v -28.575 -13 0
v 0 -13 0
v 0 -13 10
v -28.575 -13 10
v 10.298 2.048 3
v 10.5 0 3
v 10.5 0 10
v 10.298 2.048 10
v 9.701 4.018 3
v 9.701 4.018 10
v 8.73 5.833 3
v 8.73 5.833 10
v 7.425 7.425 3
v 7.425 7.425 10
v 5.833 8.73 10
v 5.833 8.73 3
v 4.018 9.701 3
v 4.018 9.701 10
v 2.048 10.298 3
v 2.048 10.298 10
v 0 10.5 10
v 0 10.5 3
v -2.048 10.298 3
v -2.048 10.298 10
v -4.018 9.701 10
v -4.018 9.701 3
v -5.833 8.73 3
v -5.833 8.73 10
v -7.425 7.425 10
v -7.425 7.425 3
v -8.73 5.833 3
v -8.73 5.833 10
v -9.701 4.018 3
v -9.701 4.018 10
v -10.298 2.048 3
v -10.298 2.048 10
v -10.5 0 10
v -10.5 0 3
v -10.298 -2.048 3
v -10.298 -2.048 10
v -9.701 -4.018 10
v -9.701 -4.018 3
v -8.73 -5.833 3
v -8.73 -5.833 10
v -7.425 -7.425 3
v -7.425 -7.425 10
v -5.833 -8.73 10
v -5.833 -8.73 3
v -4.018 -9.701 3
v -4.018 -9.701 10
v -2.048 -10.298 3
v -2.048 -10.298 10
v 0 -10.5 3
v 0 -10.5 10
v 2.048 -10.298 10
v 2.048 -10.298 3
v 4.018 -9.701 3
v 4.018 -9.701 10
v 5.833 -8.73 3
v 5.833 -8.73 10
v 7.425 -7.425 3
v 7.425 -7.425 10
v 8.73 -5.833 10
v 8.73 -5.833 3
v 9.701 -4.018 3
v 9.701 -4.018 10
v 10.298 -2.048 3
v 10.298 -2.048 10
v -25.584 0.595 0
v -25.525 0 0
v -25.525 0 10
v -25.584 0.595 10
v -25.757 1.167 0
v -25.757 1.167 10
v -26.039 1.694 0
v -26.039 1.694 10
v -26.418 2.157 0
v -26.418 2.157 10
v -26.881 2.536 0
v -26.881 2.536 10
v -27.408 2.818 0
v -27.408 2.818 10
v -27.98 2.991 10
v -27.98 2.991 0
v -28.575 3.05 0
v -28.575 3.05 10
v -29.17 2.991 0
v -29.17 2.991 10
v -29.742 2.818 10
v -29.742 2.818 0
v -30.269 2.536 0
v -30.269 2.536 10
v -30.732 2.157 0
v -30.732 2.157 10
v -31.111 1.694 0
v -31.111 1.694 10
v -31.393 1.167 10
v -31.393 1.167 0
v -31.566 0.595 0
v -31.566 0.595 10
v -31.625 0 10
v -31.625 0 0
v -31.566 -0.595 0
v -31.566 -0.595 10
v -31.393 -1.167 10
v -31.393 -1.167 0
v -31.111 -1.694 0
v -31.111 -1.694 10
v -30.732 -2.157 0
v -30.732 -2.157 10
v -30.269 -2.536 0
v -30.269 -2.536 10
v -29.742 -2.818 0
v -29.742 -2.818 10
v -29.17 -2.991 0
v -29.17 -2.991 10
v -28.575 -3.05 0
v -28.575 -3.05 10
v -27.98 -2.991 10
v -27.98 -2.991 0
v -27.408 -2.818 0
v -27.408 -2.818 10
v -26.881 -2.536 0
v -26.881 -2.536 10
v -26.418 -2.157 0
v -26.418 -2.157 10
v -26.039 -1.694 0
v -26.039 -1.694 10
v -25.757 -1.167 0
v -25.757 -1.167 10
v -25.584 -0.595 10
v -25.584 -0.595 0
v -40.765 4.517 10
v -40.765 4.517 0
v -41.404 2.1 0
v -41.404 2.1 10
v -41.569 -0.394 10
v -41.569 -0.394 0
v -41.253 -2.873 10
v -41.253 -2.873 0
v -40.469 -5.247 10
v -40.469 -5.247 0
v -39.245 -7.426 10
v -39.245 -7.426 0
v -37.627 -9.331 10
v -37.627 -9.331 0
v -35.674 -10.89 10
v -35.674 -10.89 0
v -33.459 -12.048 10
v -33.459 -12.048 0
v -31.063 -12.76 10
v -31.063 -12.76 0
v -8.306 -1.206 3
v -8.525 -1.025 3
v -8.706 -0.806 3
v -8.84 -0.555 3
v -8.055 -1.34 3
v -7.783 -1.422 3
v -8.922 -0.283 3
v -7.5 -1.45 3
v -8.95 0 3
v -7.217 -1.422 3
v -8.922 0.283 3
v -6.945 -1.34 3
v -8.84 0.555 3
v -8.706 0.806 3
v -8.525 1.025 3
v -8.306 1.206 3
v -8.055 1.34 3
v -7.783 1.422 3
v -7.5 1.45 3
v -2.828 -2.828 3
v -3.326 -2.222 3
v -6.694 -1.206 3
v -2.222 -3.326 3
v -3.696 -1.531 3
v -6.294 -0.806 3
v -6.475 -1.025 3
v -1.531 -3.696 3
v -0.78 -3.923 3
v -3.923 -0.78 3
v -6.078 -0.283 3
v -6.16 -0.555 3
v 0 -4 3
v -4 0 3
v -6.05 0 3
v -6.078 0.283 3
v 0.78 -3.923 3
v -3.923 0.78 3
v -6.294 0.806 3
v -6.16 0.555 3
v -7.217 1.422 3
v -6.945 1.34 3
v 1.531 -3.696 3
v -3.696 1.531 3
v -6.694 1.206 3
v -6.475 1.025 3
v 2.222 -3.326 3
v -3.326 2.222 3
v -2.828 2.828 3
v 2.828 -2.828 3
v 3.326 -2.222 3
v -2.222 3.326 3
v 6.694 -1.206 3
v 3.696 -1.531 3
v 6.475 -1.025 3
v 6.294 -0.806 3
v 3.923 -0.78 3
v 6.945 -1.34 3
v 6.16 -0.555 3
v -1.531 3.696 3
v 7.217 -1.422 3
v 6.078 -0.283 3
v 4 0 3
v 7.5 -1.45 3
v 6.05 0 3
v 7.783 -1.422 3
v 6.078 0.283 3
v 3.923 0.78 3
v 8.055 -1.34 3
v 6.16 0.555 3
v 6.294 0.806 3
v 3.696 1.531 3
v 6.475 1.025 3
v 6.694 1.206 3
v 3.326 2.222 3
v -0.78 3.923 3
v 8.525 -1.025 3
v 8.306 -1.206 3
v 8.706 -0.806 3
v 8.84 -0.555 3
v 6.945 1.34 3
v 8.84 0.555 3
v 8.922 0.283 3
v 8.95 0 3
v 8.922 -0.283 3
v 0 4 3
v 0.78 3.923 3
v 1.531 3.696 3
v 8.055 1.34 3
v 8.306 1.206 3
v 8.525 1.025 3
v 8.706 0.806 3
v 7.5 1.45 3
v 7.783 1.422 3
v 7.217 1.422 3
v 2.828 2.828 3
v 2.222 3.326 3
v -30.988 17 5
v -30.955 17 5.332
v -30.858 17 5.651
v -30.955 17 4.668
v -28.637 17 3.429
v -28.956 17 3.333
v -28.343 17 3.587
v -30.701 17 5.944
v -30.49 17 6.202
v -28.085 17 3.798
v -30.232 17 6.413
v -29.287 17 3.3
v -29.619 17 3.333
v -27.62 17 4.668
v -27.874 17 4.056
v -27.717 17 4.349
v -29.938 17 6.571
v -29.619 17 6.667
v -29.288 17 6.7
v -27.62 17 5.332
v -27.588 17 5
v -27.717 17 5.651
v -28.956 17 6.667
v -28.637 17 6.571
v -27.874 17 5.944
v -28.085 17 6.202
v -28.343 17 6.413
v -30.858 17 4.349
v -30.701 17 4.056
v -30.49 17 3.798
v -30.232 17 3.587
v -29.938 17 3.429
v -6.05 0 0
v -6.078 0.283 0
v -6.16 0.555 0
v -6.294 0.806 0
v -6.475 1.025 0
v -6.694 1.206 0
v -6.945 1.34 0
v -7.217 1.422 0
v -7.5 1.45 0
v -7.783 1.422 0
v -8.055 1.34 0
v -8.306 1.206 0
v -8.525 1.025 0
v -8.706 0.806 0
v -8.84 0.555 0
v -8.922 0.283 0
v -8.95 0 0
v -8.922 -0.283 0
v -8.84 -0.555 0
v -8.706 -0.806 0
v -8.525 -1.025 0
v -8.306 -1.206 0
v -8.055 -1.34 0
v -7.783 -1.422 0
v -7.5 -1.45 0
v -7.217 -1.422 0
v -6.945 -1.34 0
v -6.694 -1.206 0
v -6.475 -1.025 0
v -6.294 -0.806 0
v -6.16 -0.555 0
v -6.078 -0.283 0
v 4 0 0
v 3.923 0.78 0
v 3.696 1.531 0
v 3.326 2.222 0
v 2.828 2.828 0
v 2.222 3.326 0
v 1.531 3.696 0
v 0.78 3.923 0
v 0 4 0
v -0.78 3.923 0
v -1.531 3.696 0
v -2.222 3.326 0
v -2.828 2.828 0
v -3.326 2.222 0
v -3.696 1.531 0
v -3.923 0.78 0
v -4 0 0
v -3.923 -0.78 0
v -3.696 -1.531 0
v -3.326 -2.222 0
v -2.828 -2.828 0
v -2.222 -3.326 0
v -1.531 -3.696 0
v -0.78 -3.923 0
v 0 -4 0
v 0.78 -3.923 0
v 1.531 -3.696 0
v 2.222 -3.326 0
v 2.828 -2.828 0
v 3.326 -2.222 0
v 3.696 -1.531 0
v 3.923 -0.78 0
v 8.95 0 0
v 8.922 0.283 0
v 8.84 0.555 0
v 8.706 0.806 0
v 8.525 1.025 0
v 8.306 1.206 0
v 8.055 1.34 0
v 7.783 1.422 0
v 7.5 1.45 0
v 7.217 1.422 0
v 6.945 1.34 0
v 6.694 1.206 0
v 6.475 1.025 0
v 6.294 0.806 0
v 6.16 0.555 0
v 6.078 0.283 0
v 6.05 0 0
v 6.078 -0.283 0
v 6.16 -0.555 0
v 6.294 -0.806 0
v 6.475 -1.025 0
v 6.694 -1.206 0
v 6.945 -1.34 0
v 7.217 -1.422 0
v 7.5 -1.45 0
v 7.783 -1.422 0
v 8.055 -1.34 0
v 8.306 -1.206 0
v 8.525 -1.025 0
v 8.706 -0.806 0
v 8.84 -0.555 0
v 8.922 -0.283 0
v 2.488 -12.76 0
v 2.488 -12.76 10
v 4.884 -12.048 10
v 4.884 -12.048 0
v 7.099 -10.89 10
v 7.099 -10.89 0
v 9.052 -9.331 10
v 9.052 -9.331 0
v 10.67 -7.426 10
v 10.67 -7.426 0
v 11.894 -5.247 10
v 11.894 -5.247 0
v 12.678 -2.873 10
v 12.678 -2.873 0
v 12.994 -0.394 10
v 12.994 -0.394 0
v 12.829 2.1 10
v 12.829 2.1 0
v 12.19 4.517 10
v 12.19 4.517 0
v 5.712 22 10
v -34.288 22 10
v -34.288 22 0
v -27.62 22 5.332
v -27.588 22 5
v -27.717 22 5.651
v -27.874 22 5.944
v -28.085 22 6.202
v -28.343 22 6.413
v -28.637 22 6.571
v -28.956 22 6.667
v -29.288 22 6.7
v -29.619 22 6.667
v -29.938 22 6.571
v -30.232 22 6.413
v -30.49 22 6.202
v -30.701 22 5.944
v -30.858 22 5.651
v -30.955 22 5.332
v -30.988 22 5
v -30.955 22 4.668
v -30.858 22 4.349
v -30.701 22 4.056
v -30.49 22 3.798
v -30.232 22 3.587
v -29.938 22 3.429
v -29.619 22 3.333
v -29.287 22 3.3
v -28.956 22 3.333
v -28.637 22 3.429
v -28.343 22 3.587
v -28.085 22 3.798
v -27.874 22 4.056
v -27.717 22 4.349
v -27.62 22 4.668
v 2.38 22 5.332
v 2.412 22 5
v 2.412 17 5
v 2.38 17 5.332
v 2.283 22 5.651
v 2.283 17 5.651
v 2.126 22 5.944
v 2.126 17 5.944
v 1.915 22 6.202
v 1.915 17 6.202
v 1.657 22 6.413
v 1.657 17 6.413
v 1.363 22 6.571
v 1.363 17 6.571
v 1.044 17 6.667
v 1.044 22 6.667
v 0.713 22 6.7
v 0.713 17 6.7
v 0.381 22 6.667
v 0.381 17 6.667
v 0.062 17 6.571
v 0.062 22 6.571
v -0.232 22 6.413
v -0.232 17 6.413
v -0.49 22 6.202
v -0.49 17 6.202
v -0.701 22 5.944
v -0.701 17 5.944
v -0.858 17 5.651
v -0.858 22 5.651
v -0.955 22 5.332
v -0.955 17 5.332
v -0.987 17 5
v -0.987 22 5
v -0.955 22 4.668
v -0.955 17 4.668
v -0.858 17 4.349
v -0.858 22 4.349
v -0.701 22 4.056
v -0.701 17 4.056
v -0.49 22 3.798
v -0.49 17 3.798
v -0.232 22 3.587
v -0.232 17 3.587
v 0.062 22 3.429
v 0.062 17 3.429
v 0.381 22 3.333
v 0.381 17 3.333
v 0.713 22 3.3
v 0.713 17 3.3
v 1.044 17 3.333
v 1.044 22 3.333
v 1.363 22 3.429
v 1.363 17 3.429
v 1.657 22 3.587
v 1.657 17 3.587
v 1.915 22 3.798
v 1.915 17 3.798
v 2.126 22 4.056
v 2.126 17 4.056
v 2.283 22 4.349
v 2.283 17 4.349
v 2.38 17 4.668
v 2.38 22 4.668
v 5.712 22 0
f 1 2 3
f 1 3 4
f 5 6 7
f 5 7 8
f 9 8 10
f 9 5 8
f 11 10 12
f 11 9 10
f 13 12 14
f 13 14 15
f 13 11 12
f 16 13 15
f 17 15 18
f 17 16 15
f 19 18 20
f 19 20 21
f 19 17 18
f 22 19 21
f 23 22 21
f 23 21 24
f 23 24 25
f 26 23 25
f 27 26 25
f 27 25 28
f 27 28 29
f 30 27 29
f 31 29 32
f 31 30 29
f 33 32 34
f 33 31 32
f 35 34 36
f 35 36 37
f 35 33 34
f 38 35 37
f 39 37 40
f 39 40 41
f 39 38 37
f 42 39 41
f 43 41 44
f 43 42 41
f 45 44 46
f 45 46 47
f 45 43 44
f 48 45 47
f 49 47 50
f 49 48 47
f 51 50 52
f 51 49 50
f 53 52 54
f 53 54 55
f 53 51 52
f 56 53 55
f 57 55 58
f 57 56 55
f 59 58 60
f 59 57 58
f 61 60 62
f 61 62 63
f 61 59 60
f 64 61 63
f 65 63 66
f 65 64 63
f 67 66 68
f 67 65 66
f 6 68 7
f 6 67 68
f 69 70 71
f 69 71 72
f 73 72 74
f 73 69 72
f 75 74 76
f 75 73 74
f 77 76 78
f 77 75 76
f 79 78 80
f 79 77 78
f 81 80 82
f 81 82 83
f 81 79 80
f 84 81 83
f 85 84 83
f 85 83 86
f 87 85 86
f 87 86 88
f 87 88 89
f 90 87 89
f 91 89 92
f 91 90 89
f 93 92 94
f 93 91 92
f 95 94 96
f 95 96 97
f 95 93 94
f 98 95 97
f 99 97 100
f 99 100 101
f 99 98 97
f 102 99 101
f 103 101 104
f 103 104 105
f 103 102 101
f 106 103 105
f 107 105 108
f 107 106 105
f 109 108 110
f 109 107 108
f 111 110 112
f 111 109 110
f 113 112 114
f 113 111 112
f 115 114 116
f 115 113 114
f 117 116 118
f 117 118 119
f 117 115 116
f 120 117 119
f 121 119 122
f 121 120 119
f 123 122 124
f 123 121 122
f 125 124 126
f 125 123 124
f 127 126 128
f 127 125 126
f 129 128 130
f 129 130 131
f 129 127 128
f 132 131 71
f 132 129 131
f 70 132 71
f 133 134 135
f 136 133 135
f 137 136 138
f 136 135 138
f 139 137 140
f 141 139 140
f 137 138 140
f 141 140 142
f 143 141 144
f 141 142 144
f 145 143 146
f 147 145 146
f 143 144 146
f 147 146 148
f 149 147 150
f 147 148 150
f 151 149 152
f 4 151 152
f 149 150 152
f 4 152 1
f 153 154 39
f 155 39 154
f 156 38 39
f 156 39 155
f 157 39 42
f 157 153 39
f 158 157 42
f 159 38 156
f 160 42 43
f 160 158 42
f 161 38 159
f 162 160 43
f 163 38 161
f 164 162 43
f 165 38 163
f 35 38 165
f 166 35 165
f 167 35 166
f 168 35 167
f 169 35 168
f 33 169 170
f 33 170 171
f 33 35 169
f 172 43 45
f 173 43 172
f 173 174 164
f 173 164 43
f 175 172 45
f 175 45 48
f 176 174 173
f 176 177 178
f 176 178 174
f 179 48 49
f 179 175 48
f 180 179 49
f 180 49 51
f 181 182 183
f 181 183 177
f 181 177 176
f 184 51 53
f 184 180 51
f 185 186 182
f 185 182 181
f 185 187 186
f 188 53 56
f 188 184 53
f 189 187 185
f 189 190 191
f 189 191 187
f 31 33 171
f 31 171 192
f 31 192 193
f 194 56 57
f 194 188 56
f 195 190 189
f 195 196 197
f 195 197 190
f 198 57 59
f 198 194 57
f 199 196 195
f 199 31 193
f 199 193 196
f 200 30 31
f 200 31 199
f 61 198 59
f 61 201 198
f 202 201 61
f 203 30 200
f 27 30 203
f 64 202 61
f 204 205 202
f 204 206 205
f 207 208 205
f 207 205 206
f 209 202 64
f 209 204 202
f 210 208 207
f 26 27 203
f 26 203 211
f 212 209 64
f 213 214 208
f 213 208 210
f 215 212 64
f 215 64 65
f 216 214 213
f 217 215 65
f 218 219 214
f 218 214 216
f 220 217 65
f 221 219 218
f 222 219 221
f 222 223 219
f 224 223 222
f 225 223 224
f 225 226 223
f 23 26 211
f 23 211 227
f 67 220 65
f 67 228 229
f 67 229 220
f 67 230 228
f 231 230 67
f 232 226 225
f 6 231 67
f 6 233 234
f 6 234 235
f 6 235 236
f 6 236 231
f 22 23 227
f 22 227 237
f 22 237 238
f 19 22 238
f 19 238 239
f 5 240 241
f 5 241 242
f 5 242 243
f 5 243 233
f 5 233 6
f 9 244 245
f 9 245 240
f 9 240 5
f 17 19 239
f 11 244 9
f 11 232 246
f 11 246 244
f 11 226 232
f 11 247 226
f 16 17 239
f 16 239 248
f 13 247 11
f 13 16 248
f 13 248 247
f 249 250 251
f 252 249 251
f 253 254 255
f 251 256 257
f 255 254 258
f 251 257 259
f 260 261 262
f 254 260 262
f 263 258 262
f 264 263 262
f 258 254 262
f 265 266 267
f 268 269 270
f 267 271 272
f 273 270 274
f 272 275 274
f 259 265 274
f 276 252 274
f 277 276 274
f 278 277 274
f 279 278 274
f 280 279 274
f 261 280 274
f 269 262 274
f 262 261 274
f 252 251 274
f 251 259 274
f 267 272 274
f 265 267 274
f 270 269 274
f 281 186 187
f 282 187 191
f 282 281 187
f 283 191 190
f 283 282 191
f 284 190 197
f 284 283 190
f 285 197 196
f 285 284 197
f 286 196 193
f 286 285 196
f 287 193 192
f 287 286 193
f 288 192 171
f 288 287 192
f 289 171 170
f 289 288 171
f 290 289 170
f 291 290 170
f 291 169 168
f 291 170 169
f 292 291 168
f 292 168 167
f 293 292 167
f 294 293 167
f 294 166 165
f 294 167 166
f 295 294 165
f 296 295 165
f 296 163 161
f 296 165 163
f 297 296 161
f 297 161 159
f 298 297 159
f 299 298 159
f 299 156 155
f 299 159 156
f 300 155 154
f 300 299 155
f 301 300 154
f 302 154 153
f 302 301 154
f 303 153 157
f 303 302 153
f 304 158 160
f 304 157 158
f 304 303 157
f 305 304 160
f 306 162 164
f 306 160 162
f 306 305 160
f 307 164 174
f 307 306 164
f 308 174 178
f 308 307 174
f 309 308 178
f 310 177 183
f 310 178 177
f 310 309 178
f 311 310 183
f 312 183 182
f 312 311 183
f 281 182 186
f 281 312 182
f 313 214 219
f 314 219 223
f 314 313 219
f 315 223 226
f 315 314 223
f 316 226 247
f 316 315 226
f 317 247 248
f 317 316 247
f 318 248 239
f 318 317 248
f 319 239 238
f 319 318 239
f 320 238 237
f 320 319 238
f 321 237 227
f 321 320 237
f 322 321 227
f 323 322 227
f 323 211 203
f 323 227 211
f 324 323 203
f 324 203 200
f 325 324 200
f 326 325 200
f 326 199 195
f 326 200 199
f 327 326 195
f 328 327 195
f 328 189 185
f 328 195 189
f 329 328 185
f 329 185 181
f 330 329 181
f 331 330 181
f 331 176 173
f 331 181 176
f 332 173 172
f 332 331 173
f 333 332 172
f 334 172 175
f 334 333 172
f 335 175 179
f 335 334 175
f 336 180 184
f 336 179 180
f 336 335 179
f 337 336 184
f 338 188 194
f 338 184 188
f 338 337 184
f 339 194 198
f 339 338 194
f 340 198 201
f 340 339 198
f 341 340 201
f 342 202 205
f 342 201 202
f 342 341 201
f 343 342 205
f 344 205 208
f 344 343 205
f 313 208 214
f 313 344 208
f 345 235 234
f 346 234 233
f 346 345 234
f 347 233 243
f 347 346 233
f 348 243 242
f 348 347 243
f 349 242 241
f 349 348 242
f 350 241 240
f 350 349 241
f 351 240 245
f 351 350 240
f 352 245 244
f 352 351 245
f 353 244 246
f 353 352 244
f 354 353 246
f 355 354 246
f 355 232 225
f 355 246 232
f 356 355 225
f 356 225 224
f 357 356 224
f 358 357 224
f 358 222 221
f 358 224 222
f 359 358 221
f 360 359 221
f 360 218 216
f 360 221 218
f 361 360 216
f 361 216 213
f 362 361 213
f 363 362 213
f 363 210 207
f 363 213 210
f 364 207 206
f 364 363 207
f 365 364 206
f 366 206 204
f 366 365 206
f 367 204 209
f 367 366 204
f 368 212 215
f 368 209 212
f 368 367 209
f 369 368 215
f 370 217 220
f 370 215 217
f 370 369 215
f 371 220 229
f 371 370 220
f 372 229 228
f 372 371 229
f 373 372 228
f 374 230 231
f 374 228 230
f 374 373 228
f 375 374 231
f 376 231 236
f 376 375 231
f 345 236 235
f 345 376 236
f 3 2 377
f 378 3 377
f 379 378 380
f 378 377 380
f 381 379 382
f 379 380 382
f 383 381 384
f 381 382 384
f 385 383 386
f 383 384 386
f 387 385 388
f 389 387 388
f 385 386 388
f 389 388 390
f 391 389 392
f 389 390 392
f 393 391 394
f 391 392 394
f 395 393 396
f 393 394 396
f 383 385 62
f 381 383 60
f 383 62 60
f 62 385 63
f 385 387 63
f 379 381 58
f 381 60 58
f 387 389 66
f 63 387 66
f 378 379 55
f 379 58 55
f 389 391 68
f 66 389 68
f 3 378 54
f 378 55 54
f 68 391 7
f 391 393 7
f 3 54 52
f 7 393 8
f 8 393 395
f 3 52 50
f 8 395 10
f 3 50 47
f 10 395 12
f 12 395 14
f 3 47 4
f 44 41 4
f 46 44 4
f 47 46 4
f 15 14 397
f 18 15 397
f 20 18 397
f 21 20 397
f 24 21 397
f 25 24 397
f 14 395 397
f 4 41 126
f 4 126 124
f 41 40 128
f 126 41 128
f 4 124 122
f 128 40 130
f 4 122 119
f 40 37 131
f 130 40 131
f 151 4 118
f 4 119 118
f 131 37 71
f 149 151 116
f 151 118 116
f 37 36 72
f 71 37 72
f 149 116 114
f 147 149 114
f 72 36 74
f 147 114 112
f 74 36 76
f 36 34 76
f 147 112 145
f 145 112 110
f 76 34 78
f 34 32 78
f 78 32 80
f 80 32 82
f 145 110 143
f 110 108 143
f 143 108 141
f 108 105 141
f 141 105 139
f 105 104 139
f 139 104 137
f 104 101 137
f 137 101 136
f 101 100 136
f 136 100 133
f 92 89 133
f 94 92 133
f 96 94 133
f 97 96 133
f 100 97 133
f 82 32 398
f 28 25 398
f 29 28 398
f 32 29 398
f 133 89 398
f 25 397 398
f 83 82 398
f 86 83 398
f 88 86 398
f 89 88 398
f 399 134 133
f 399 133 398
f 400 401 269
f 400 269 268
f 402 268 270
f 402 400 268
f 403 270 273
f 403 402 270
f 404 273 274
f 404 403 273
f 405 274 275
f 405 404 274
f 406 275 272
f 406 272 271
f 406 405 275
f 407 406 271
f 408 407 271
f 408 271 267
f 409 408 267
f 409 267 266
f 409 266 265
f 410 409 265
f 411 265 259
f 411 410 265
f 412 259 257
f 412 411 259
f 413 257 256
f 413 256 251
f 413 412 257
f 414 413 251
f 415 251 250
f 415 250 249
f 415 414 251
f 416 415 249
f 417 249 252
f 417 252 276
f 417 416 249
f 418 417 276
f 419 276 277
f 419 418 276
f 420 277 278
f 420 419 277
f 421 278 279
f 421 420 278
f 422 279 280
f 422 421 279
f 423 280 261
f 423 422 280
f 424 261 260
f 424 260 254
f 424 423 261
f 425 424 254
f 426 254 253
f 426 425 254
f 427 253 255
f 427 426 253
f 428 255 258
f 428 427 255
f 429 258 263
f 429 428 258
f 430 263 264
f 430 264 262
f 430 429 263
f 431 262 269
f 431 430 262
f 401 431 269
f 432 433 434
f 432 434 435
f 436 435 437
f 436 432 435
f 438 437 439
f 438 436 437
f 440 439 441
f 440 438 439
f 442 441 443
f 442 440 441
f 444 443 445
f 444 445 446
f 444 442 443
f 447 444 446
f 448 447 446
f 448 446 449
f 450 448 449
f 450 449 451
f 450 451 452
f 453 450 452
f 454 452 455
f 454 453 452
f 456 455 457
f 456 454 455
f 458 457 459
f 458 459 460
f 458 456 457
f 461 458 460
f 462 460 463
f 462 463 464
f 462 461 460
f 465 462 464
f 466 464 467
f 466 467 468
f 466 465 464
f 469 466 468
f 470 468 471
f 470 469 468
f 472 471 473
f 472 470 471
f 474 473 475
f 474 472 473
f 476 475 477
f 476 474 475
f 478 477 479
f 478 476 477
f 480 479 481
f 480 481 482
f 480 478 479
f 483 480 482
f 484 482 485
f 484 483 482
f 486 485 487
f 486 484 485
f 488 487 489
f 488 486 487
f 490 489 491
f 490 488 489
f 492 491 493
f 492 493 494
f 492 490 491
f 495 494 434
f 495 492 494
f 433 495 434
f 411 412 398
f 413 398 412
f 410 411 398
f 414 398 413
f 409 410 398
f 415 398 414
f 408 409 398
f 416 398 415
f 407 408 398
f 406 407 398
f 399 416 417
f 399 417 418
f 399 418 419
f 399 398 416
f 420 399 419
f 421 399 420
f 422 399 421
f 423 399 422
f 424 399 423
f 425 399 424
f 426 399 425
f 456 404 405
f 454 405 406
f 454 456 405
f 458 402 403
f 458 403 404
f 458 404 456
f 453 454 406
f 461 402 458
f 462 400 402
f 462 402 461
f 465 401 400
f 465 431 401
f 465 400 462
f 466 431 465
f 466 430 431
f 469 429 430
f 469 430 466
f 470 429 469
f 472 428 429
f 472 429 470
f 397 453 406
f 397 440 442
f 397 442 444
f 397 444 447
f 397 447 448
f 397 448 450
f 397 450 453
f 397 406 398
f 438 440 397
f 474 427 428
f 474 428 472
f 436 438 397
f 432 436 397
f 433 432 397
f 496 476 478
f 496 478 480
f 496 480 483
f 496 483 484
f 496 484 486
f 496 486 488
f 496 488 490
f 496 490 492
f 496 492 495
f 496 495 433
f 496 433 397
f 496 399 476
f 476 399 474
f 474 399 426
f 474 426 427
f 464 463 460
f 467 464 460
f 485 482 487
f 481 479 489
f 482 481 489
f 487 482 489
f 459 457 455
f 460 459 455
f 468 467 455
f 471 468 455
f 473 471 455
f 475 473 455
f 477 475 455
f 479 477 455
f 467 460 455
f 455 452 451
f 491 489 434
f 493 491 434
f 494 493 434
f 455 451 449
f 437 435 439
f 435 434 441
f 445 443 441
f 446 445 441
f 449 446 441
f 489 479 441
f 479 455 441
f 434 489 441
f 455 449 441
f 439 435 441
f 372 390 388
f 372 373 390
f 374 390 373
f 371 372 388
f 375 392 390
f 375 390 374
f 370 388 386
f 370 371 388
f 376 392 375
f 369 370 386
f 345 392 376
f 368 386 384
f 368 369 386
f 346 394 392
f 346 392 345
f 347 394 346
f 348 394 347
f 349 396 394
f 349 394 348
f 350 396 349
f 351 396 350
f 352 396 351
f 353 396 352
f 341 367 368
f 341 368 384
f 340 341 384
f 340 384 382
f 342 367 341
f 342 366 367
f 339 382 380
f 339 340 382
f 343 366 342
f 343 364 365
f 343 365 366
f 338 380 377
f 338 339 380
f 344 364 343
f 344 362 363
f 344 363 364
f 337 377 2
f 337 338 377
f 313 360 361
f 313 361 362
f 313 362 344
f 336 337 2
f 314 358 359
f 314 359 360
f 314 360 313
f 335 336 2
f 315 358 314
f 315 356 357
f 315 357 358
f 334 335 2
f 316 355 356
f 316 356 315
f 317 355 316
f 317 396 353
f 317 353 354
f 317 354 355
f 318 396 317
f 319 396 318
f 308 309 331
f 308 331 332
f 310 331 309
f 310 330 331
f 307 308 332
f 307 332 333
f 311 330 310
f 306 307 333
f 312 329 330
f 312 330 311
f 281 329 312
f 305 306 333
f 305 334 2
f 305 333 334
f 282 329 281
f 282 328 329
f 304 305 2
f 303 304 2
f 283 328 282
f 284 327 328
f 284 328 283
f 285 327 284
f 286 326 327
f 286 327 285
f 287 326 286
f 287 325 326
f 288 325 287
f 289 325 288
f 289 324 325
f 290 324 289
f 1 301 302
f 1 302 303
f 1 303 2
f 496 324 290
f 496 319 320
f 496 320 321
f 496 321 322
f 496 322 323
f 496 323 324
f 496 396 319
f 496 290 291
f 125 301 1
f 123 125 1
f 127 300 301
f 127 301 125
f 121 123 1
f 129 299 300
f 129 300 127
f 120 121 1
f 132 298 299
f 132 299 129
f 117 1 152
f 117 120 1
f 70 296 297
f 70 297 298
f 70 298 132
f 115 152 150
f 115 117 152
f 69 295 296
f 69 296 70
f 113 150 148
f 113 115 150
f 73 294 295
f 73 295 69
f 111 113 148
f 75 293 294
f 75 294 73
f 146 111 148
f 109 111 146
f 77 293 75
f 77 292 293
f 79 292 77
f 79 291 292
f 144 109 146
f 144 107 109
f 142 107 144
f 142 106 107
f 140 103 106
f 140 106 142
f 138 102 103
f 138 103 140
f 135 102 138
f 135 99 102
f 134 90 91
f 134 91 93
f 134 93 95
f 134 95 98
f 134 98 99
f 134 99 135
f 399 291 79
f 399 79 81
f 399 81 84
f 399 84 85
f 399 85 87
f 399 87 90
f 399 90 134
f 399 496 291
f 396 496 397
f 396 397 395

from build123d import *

# Parameters (mm, degrees)
SKETCH002_R     = 4
SKETCH002_R_2   = 1.45
SKETCH002_R_3   = 3.05
PAD002_DEPTH    = 10
SKETCH003_R     = 10.5
POCKET_DEPTH    = 7
SKETCH004_R     = 1.7
POCKET001_DEPTH = 5


with BuildPart() as part:
    # Sketch002 → Pad002 (new body)
    with BuildSketch(Plane.XY):
        with BuildLine():
            Line((-34.2875, 22), (5.7125, 22))
            Line((5.7125, 22), (12.190202, 4.516521))
            ThreePointArc((0, -13), (10.670398, -7.425807), (12.190202, 4.516521))
            Line((0, -13), (-28.575, -13))
            ThreePointArc((-40.765202, 4.516521), (-39.245398, -7.425807), (-28.575, -13))
            Line((-40.765202, 4.516521), (-34.2875, 22))
        make_face()
        Circle(SKETCH002_R, mode=Mode.SUBTRACT)
        with Locations((7.5, 0)):
            Circle(SKETCH002_R_2, mode=Mode.SUBTRACT)
        with Locations((-7.5, 0)):
            Circle(SKETCH002_R_2, mode=Mode.SUBTRACT)
        with Locations((-28.575, 0)):
            Circle(SKETCH002_R_3, mode=Mode.SUBTRACT)
    extrude(amount=PAD002_DEPTH)

    # Sketch003 → Pocket (cut)
    with BuildSketch(Plane.XY.offset(3)):
        Circle(SKETCH003_R)
    extrude(amount=POCKET_DEPTH, mode=Mode.SUBTRACT)

    # Sketch004 → Pocket001 (cut)
    with BuildSketch(Plane.XZ.offset(-22)):
        with Locations((-29.2875, 5)):
            Circle(SKETCH004_R)
        with Locations((0.7125, 5)):
            Circle(SKETCH004_R)
    extrude(amount=POCKET001_DEPTH, mode=Mode.SUBTRACT)


solid = part.part
